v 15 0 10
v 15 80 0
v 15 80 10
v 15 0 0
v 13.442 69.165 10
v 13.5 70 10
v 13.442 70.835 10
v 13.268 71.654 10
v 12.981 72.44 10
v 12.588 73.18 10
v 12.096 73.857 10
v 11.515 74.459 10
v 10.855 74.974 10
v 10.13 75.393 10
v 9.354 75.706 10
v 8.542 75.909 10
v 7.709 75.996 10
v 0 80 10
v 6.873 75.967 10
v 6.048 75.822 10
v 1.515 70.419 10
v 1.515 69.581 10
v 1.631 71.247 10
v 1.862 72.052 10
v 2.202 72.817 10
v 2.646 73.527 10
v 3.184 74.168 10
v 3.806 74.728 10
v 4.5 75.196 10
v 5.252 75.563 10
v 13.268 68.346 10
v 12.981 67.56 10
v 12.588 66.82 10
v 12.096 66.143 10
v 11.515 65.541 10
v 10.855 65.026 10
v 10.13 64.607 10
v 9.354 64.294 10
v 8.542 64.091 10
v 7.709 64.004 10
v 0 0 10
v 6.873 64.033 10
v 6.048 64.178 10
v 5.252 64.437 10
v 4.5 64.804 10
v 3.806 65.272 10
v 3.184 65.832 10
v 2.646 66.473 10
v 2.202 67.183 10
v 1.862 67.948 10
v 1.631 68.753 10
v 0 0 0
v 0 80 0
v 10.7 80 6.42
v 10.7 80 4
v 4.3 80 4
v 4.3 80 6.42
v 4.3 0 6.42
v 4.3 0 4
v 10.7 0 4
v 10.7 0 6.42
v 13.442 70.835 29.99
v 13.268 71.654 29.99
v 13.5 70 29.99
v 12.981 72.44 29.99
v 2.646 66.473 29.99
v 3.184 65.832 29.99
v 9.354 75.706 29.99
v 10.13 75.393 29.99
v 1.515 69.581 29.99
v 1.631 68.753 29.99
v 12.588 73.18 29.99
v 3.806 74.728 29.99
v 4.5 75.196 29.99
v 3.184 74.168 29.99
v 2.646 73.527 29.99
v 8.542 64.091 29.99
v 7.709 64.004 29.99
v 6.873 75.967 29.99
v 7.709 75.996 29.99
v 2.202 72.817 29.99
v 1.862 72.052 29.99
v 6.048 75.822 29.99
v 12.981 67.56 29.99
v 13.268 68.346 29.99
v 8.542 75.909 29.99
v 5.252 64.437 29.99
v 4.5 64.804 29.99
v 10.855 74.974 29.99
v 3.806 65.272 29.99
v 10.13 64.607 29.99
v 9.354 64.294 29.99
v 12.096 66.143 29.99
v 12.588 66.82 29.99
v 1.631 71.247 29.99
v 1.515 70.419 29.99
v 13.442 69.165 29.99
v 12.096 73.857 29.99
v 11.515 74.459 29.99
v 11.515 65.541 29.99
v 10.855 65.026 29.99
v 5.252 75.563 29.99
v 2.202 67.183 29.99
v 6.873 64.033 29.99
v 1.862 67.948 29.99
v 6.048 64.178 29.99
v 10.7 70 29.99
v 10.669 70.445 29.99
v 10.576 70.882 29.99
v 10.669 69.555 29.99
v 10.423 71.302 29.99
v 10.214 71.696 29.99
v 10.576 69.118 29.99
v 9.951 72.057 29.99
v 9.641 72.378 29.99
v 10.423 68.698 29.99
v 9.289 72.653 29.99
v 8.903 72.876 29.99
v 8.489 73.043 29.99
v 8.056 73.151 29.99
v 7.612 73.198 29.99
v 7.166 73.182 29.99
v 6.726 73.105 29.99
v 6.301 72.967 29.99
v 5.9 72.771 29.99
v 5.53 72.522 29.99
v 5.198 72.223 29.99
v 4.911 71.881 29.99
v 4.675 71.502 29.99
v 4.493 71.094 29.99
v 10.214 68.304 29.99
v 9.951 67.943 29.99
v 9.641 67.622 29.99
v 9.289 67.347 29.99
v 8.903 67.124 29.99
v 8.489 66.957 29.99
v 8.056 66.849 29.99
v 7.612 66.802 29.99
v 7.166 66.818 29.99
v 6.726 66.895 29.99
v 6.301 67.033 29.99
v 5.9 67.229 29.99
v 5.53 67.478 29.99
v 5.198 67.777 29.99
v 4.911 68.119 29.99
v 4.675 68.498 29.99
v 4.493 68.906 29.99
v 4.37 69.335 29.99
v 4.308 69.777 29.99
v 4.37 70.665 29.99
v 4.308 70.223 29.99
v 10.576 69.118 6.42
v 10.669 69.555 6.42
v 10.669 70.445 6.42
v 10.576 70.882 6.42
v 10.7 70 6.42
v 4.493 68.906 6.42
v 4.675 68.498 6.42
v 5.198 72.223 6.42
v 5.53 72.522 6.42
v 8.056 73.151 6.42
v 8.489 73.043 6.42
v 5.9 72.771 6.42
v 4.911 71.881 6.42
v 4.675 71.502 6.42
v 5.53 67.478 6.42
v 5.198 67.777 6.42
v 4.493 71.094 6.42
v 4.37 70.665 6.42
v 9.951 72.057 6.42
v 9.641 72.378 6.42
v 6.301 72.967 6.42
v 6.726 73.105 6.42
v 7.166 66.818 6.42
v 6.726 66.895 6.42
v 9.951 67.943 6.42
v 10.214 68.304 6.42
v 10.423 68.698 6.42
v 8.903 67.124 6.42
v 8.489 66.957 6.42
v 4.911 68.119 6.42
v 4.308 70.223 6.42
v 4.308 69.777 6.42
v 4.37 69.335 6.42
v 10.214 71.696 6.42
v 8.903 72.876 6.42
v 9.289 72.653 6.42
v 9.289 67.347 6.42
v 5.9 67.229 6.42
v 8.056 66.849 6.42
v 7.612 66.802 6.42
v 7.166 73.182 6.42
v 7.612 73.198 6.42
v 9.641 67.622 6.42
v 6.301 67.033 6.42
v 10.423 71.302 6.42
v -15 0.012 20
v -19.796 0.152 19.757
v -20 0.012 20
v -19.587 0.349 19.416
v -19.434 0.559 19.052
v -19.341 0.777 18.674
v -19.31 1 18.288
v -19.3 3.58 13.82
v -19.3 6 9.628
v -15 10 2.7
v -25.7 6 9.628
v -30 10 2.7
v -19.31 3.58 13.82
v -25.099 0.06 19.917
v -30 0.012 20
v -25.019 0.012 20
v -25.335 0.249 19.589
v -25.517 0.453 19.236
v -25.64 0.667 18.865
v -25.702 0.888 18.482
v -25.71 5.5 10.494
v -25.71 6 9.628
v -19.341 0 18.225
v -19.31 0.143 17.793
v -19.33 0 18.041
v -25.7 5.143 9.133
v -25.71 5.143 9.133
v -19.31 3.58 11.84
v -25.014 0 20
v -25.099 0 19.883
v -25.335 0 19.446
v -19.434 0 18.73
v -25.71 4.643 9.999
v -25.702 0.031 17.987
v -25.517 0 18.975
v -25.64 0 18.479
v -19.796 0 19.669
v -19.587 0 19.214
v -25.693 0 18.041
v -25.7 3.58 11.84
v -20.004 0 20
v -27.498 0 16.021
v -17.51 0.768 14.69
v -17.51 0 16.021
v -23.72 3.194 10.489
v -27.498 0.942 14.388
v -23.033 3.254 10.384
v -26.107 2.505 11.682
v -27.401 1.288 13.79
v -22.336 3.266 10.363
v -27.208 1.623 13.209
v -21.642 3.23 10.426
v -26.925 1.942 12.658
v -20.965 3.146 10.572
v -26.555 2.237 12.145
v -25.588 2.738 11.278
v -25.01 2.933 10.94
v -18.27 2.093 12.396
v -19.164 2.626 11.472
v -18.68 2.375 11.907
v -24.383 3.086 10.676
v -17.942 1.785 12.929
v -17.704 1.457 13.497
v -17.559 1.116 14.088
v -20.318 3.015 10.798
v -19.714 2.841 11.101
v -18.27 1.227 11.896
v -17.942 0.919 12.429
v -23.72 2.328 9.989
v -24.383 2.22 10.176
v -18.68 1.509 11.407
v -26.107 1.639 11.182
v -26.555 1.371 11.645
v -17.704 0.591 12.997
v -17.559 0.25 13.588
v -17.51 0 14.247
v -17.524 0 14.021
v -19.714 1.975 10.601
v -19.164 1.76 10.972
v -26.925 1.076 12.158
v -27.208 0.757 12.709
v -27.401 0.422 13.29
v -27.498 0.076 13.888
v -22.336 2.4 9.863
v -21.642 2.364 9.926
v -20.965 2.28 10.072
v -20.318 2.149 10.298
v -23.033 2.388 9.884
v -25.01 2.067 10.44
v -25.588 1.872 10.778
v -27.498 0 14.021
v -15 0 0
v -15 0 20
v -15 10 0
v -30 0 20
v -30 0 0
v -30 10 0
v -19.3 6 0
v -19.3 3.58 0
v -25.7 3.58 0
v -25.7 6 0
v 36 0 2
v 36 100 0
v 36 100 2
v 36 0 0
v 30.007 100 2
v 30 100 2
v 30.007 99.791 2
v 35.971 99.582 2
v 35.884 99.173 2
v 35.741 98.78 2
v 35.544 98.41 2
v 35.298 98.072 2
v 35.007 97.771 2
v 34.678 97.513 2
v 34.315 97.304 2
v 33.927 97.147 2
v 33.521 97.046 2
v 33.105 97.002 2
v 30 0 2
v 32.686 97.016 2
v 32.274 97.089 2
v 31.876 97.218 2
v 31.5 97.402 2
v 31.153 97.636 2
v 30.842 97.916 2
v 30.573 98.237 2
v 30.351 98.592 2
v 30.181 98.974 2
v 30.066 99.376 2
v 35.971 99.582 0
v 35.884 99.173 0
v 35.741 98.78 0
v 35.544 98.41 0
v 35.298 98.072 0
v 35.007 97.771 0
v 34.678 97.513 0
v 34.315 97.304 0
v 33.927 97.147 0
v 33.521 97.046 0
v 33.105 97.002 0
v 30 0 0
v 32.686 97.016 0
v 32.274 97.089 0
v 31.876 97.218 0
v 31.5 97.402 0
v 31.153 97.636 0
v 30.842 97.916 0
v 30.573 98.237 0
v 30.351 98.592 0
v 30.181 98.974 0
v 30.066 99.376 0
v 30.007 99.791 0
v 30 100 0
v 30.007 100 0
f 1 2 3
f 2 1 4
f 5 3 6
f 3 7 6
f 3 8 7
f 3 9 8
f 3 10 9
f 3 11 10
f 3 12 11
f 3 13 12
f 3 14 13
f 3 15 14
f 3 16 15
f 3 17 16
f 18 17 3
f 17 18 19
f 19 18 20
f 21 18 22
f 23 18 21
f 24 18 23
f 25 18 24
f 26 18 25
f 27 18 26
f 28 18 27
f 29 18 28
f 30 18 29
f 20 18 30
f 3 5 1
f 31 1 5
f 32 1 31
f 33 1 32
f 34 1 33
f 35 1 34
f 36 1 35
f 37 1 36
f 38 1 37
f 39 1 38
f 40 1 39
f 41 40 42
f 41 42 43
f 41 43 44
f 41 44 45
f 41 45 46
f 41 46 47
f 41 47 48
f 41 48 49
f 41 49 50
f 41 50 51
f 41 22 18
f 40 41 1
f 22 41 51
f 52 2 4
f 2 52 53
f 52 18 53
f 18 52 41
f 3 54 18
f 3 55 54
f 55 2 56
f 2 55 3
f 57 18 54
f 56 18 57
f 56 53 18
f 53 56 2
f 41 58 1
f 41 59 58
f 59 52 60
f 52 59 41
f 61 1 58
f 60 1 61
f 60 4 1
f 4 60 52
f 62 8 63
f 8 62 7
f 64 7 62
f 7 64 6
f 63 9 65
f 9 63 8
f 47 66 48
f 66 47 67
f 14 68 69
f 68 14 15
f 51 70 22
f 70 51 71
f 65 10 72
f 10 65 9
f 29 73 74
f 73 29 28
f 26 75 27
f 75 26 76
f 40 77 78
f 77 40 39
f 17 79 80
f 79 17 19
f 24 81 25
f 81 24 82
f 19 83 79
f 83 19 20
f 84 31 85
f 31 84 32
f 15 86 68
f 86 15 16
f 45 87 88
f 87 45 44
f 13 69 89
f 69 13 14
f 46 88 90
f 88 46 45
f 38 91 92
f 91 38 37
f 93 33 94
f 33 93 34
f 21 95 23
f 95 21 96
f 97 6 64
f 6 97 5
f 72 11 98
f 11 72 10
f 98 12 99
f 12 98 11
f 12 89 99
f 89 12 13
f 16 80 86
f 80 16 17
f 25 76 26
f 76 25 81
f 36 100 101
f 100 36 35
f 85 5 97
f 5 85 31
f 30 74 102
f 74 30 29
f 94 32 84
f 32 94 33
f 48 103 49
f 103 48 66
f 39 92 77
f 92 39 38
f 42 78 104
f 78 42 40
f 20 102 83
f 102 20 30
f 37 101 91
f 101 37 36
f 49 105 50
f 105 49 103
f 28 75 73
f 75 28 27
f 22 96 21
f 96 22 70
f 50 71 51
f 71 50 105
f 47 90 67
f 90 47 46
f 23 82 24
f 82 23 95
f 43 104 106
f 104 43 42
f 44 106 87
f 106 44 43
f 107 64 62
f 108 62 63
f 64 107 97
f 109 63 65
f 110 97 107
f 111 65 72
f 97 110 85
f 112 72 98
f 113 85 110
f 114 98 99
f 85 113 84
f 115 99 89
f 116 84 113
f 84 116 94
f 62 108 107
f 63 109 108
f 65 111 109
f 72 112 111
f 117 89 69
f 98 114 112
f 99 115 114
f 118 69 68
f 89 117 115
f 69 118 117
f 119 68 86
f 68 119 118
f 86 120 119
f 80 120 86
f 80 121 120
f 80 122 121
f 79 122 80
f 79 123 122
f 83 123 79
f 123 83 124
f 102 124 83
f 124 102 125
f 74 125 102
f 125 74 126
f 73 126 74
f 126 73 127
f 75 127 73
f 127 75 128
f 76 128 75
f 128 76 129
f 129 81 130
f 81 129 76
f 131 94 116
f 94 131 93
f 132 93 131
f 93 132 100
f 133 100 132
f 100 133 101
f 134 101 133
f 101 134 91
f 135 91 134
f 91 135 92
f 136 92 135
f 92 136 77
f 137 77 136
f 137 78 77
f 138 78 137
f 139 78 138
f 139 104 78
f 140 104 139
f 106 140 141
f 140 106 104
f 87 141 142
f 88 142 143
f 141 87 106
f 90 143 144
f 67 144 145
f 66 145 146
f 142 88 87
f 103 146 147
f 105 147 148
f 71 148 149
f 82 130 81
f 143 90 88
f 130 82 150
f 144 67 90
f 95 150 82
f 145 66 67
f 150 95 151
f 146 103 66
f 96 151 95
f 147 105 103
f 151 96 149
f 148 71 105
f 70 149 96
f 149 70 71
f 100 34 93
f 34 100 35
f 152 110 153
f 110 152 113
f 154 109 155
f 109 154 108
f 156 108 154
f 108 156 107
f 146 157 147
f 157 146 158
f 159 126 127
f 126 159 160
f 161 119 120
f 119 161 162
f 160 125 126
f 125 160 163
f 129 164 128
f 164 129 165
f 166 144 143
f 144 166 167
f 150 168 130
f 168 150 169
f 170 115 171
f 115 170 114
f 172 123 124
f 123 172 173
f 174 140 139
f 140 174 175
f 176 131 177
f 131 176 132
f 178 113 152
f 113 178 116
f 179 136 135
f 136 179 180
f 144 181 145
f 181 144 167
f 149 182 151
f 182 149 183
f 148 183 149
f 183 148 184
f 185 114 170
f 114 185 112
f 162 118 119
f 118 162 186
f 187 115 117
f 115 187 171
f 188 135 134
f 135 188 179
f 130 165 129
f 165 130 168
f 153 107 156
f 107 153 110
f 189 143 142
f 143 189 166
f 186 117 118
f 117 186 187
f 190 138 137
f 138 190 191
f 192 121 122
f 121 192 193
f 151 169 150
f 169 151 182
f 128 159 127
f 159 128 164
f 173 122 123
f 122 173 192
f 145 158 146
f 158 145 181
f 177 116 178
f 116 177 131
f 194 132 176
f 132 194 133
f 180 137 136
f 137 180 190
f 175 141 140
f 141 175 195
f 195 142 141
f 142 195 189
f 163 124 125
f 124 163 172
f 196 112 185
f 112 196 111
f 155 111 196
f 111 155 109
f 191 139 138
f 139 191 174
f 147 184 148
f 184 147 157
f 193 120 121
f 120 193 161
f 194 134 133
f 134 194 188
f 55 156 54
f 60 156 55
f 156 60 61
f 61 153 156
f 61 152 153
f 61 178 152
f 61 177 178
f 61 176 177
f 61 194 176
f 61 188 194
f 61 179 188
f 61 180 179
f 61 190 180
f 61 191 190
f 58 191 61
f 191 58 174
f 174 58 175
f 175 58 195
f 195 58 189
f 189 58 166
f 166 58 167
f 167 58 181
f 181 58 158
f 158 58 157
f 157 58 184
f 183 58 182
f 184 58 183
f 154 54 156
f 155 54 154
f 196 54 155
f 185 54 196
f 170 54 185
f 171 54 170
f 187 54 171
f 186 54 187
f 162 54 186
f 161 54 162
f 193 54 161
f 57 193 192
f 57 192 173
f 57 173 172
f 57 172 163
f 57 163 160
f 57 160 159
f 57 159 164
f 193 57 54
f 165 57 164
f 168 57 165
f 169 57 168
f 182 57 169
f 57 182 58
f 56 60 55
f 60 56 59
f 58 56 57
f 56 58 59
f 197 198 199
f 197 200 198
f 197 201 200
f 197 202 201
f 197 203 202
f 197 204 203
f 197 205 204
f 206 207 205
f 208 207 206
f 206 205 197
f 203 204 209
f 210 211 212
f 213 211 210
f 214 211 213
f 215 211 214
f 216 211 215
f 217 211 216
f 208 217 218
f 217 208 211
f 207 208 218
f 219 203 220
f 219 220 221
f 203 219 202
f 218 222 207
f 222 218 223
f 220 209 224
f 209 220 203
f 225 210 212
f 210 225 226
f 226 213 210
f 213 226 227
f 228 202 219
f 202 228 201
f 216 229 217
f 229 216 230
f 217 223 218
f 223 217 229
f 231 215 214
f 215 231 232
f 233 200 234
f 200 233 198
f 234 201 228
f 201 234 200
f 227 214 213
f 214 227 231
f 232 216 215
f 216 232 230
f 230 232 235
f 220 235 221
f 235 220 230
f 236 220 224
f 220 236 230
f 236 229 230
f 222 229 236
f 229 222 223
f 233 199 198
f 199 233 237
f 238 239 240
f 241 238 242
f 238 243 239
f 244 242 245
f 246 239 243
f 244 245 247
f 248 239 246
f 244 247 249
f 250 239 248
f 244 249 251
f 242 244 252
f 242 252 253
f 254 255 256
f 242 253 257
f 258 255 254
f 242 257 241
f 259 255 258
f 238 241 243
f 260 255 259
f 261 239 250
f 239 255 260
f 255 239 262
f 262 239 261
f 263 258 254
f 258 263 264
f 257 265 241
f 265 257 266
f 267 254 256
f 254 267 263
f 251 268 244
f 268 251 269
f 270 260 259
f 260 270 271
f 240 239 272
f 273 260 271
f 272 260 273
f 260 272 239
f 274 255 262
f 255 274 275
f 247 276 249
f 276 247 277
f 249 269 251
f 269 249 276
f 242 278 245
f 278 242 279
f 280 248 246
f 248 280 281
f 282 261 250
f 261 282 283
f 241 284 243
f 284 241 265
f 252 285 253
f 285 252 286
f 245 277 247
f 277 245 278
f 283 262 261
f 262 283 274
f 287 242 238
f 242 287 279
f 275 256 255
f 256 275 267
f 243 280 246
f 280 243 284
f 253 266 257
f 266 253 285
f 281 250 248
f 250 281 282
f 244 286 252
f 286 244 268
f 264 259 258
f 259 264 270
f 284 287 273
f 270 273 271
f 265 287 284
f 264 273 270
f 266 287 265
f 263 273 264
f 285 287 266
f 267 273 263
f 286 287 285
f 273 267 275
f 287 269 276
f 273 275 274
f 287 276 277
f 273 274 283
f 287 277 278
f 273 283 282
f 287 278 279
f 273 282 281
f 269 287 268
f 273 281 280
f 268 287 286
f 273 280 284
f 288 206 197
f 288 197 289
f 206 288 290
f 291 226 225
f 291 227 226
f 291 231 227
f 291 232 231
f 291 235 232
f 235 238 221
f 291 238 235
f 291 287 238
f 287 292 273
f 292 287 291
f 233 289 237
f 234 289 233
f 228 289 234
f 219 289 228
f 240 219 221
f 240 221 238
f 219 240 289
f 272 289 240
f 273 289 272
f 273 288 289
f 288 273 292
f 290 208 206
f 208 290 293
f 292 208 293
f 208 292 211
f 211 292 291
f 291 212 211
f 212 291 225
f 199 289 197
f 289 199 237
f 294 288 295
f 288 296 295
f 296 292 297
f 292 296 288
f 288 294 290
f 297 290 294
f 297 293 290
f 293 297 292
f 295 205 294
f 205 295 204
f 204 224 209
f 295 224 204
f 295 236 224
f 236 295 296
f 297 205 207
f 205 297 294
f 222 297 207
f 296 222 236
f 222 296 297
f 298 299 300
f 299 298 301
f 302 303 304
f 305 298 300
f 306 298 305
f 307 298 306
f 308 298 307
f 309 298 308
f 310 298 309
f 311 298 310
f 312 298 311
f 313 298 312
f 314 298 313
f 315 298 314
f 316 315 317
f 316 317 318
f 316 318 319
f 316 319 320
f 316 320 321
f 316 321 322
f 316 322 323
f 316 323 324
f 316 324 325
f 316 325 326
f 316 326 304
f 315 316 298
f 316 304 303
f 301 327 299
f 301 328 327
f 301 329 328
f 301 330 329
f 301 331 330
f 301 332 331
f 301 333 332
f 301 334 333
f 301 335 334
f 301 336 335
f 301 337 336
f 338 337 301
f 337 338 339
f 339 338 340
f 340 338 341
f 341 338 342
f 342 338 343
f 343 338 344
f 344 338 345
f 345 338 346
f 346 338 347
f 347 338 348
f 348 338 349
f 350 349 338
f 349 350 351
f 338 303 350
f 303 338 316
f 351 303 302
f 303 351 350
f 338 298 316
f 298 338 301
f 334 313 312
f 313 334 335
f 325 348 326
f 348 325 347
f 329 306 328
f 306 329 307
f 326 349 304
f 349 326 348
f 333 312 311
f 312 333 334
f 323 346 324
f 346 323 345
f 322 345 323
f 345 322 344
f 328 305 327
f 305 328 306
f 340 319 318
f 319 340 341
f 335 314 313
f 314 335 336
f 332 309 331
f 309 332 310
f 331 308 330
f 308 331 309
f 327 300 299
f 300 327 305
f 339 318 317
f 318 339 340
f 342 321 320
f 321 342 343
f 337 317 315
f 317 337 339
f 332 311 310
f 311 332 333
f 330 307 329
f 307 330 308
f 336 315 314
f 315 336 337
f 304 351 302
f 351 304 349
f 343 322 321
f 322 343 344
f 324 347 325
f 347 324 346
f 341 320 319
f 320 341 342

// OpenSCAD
// include <../libs/pw_primitives.scad>;

$fn=45;

eps = 0.01; eps2 = eps*2;
tol = 0.2;
magnet_wid = 6; magnet_height = 2;
body_wid = 15; body_len = 100; body_height = 10;
feeder_tube_height = 20; feeder_tube_wid = 12;
pusher_wid = magnet_wid;
pusher_chan_wid = magnet_wid + tol*2; pusher_chan_x = (body_wid-magnet_wid)/2-tol;
pusher_chan_height = magnet_height + tol*2; pusher_chan_z = 4;
end_slot_height = 1; end_slot_len = 10;
bot_angle = 30; bot_len = body_height/sin(bot_angle);
diag_front_x_off = (body_len-bot_len)+(body_height*sin(bot_angle))/2+tol;
washer_dia = 10; washer_height = 1; washer_z_off = 1;

// pegs at the corners of a box from -x,-y to x,y
module pegs(x, y, r, h) {
    translate([ x,  y, 0]) cylinder(r=r, h=h);
    translate([-x,  y, 0]) cylinder(r=r, h=h);
    translate([ x, -y, 0]) cylinder(r=r, h=h);
    translate([-x, -y, 0]) cylinder(r=r, h=h);
}

difference() {
    // the body
    union() {
        cube([body_wid, body_len-bot_len, body_height]);
        translate([body_wid/2, 70, body_height-eps])
          cylinder(h=feeder_tube_height, d=feeder_tube_wid);
    };
    // the feeder tube;
    translate([body_wid/2, 70, pusher_chan_z+eps]) 
      cylinder(h=feeder_tube_height+body_height, d=magnet_wid+tol*2);
    // the tube for the pusher
    translate([pusher_chan_x, -eps, pusher_chan_z]) 
      cube([pusher_chan_wid, body_len+eps2, pusher_chan_height+eps2]);
    // the channel for the pusher finger handle
    
    // the bottom angle
    // multmatrix([ 
    //   [1, 0, 0, -eps], 
    //   [0, 1, 0, (body_len-bot_len)+eps], 
    //   [0, sin(bot_angle), 1, -body_height] 
    // ]) union() {
}

translate([-30, body_height, 0]) rotate([90, 0, 0]) difference() {
    cube([body_wid, bot_len, body_height]);
    // the feeder tube
    translate([pusher_chan_x, -eps, pusher_chan_z]) 
      cube([pusher_chan_wid, body_len+eps2, pusher_chan_height+eps2]);
    // the stuff on an angle
    translate([-eps, (body_height*sin(bot_angle))/2+tol, 0]) rotate([bot_angle, 0, 0]) union() {
        // the main face
        translate([0, 0, -body_height]) cube([body_wid+eps2, bot_len, body_height]);
        // the slot to the magnet placer hole
        translate([pusher_chan_x, bot_len*(pusher_chan_z/body_height), -eps])
          hull() {
            translate([pusher_chan_wid/2, end_slot_len, 0]) 
              cylinder(h=end_slot_height, d=pusher_chan_wid);
            cube([pusher_chan_wid, 1, end_slot_height]);
        }
        // the slot for the washer
        translate([body_wid/2, 5+end_slot_len, washer_z_off+end_slot_height]) hull() {
            cylinder(h=washer_height, d=washer_dia);
            translate([0, washer_dia/2, 0]) cylinder(h=washer_height, d=washer_dia);
        }
    }
};

translate([30, 0, 0]) union() {
    difference() {
        cube([6, 100, 2]);
        translate([6/2, 100, -eps]) cylinder(h=2+eps2, d=6);
    };
}
